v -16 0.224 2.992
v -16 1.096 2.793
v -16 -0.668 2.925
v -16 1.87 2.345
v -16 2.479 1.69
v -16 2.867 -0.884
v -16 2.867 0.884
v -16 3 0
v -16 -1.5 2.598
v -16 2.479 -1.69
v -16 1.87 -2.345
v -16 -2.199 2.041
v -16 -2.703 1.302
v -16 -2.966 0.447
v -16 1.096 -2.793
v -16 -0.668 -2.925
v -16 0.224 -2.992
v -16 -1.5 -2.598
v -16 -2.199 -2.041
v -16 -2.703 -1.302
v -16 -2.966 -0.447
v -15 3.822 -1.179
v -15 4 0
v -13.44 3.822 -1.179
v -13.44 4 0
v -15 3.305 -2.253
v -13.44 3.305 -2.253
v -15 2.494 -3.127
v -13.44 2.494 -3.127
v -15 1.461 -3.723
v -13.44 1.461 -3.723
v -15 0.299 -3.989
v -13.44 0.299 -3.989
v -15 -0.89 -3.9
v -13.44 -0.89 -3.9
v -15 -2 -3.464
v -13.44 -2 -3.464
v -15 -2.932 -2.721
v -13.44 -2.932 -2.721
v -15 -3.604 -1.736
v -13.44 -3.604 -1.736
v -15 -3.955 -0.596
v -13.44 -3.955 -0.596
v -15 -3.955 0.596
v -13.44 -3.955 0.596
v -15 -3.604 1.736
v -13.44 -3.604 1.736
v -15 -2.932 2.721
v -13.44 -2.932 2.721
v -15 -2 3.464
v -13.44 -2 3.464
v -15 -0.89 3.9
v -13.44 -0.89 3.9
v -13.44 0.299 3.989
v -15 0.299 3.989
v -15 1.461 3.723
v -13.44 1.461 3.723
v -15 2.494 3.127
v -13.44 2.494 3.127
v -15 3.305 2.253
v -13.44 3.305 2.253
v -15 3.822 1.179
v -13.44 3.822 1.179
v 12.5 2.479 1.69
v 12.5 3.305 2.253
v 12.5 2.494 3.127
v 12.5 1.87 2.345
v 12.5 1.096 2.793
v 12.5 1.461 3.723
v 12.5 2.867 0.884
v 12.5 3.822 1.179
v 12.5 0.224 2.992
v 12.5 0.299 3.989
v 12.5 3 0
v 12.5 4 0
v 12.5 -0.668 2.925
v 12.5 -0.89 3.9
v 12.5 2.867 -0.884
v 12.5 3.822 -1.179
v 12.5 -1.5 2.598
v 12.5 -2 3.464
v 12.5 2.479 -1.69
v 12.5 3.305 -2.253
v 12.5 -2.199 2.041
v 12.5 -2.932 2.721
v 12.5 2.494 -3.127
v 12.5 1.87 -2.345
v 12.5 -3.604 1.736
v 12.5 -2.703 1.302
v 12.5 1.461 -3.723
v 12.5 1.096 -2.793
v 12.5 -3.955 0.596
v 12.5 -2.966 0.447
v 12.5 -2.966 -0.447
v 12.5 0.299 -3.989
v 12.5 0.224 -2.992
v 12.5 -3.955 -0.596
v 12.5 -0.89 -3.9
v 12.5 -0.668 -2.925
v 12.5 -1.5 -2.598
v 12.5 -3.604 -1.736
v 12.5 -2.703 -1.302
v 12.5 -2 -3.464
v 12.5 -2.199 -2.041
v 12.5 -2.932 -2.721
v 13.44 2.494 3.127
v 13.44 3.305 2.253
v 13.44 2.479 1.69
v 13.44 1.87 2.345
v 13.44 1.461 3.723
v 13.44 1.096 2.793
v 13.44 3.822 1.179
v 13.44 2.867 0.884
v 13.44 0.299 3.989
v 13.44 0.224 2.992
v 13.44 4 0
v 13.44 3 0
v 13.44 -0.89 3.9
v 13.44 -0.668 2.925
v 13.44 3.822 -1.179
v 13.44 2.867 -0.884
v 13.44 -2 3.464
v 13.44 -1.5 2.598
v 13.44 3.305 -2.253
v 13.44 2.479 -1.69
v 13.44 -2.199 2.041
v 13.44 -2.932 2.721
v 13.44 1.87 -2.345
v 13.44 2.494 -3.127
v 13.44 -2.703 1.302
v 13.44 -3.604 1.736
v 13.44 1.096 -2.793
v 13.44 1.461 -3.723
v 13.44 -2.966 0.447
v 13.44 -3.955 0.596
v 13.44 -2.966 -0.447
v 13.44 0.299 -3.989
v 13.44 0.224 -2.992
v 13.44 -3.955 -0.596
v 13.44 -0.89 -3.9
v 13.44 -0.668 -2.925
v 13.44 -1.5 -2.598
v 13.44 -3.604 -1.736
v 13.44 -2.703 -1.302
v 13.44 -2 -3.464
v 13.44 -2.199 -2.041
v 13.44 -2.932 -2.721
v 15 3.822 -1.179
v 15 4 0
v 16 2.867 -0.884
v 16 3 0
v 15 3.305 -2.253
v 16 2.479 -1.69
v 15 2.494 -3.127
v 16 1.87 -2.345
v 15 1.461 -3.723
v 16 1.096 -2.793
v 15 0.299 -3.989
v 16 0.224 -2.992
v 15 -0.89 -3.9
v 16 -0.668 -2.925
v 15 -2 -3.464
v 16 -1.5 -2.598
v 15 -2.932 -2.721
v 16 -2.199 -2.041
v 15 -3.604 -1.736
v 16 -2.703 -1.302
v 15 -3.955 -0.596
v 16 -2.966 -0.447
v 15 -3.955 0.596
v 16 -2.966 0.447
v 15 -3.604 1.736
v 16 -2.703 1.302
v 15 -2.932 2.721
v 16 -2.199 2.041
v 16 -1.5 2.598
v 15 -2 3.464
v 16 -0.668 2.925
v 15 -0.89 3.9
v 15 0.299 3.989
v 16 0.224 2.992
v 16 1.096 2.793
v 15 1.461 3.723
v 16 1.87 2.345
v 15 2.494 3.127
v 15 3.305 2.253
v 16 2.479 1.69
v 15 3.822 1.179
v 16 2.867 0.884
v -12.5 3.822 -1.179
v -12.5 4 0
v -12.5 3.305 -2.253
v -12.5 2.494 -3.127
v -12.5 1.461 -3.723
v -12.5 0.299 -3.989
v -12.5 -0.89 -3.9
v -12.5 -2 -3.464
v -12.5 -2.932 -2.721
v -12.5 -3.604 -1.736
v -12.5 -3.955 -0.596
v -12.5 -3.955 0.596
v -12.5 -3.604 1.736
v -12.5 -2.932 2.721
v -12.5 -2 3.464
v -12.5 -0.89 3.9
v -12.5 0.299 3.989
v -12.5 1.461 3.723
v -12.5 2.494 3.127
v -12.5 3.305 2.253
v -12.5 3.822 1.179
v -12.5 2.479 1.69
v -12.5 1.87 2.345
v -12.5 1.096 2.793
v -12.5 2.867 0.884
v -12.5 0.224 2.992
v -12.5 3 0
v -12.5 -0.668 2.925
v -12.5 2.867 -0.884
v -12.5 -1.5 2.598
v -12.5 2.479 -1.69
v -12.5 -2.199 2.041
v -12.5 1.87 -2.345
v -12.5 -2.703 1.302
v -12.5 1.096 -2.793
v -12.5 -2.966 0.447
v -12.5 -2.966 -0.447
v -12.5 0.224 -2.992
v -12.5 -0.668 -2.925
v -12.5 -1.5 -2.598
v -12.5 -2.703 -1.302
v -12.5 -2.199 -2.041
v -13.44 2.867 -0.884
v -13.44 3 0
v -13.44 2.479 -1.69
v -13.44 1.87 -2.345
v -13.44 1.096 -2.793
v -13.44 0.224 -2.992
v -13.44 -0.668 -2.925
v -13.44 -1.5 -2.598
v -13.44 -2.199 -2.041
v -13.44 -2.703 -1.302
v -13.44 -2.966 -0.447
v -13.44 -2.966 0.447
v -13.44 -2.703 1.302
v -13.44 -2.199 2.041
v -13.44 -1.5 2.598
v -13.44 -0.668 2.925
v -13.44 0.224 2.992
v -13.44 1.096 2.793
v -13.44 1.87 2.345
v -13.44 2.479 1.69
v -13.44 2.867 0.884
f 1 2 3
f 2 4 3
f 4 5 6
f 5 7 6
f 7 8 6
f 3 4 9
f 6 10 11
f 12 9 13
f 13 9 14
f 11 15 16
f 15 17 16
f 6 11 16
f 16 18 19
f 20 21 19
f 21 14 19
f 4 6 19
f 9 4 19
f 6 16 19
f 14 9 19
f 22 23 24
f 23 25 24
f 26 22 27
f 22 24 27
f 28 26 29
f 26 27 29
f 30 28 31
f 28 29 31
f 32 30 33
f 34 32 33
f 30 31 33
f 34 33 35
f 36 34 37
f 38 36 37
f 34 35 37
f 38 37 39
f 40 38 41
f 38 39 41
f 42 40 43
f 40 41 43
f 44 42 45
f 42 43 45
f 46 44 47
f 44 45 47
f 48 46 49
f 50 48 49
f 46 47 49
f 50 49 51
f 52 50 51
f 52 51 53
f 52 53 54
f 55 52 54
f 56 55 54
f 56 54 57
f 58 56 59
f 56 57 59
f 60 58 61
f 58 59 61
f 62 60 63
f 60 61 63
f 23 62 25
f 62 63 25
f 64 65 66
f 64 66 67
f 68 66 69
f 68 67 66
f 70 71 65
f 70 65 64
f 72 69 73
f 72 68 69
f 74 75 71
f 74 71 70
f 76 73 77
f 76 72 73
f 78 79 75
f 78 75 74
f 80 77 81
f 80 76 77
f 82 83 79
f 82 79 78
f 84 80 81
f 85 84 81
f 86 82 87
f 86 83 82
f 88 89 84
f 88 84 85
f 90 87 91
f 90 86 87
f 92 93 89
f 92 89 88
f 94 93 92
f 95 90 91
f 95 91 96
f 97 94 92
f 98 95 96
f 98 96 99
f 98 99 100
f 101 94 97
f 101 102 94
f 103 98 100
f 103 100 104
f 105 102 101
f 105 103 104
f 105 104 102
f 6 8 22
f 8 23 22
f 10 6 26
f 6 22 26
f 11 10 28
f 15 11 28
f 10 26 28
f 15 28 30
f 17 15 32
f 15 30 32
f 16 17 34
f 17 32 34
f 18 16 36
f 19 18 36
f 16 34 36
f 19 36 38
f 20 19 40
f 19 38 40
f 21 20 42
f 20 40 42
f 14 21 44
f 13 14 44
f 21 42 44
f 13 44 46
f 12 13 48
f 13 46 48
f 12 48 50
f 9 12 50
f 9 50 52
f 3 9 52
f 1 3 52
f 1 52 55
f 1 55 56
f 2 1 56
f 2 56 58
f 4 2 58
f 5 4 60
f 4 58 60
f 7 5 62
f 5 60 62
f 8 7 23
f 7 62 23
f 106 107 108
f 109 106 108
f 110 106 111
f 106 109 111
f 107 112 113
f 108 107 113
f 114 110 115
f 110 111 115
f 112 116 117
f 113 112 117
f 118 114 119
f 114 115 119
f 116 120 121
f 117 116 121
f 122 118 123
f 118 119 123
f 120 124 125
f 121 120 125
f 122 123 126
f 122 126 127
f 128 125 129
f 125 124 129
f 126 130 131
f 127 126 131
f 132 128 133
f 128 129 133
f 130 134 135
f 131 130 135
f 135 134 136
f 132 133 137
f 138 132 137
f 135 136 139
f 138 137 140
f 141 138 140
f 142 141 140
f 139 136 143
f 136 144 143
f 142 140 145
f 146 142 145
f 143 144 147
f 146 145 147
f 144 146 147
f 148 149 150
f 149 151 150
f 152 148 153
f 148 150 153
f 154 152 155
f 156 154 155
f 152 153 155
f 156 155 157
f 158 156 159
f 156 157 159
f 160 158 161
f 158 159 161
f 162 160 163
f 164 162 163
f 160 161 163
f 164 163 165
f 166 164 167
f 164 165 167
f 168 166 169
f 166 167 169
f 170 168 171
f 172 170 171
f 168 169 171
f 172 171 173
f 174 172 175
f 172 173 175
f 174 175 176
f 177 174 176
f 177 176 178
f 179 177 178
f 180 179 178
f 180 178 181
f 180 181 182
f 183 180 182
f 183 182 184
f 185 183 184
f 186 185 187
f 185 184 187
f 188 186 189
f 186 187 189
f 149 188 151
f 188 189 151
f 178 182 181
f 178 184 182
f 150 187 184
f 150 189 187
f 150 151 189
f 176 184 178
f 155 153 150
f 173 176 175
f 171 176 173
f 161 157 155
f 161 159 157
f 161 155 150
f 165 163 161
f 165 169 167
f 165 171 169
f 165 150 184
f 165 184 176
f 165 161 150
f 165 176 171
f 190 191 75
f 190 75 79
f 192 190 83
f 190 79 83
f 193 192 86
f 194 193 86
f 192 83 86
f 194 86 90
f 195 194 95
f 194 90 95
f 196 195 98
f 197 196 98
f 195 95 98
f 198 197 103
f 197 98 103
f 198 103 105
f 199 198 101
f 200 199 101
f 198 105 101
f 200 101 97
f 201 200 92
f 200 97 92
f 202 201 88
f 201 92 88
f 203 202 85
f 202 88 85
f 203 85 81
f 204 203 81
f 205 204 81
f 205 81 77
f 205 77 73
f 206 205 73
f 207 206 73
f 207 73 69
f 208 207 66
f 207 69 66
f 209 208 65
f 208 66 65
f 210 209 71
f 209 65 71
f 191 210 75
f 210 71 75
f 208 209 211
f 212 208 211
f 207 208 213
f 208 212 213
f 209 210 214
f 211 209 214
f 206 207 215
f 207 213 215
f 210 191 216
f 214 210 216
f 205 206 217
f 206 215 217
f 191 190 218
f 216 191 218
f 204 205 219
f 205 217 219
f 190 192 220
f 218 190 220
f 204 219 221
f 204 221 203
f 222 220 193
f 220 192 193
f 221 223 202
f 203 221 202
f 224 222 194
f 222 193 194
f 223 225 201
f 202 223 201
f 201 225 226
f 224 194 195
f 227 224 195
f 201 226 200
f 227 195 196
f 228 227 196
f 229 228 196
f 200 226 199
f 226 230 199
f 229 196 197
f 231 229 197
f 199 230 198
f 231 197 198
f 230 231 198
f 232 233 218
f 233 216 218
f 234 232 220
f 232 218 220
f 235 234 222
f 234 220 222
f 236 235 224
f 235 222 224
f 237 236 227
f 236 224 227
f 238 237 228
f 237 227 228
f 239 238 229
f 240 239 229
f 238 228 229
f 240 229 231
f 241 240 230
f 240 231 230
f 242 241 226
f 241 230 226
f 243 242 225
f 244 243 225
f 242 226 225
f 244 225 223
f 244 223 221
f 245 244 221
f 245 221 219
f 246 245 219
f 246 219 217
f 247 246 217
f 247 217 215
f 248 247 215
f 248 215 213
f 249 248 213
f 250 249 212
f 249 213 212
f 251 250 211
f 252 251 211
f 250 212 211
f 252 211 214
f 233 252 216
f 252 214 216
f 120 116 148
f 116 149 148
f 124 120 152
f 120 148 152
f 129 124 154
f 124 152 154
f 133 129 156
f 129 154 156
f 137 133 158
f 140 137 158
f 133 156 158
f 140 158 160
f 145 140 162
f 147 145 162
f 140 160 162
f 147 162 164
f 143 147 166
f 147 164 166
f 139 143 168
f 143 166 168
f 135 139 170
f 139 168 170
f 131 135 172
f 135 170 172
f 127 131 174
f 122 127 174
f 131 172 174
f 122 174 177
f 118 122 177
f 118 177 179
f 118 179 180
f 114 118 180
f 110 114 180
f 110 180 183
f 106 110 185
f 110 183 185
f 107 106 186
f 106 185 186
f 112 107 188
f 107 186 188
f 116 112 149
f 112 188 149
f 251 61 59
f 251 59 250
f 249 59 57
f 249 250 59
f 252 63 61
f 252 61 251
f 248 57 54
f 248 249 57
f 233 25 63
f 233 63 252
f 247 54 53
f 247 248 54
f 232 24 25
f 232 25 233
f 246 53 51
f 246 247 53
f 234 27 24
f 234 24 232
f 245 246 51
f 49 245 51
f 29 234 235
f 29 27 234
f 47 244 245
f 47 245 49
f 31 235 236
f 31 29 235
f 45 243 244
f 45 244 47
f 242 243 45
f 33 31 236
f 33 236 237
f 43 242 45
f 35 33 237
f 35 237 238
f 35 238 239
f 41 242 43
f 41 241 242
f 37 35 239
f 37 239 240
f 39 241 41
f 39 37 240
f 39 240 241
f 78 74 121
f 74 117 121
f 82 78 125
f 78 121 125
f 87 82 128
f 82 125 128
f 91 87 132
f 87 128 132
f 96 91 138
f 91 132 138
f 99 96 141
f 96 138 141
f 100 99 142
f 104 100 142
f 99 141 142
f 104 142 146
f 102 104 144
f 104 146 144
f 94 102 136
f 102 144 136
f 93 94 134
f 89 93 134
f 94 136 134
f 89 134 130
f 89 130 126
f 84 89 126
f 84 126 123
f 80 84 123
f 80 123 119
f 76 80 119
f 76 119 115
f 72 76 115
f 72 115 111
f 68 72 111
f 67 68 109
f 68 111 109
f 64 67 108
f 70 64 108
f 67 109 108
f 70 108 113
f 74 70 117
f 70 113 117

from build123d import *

# Parameters (mm, degrees)
SKETCH1_W = 32
SKETCH1_H = 4
SKETCH4_W = 0.94
SKETCH4_H = 1
SKETCH5_W = 0.94
SKETCH5_H = 1


with BuildPart() as part:
    # Sketch1 → Revolve1 (revolve)
    with BuildSketch(Plane.XY):
        with Locations((0, 2)):
            Rectangle(SKETCH1_W, SKETCH1_H)
    revolve(axis=Axis((16, 0, 0), (-1, 0, 0)))

    # Sketch2 → Cut-Revolve1 (revolve, cut)
    with BuildSketch(Plane.XY):
        Polygon((15, 4), (16, 3), (16, 4), align=None)
    revolve(axis=Axis((16, 0, 0), (-1, 0, 0)), mode=Mode.SUBTRACT)

    # Sketch3 → Cut-Revolve2 (revolve, cut)
    with BuildSketch(Plane.XY):
        Polygon((-16, 3), (-15, 4), (-16, 4), align=None)
    revolve(axis=Axis((16, 0, 0), (-1, 0, 0)), mode=Mode.SUBTRACT)

    # Sketch4 → Cut-Revolve3 (revolve, cut)
    with BuildSketch(Plane.XY):
        with Locations((12.97, 3.5)):
            Rectangle(SKETCH4_W, SKETCH4_H)
    revolve(axis=Axis((16, 0, 0), (-1, 0, 0)), mode=Mode.SUBTRACT)

    # Sketch5 → Cut-Revolve4 (revolve, cut)
    with BuildSketch(Plane.XY):
        with Locations((-12.97, 3.5)):
            Rectangle(SKETCH5_W, SKETCH5_H)
    revolve(axis=Axis((16, 0, 0), (-1, 0, 0)), mode=Mode.SUBTRACT)


solid = part.part
